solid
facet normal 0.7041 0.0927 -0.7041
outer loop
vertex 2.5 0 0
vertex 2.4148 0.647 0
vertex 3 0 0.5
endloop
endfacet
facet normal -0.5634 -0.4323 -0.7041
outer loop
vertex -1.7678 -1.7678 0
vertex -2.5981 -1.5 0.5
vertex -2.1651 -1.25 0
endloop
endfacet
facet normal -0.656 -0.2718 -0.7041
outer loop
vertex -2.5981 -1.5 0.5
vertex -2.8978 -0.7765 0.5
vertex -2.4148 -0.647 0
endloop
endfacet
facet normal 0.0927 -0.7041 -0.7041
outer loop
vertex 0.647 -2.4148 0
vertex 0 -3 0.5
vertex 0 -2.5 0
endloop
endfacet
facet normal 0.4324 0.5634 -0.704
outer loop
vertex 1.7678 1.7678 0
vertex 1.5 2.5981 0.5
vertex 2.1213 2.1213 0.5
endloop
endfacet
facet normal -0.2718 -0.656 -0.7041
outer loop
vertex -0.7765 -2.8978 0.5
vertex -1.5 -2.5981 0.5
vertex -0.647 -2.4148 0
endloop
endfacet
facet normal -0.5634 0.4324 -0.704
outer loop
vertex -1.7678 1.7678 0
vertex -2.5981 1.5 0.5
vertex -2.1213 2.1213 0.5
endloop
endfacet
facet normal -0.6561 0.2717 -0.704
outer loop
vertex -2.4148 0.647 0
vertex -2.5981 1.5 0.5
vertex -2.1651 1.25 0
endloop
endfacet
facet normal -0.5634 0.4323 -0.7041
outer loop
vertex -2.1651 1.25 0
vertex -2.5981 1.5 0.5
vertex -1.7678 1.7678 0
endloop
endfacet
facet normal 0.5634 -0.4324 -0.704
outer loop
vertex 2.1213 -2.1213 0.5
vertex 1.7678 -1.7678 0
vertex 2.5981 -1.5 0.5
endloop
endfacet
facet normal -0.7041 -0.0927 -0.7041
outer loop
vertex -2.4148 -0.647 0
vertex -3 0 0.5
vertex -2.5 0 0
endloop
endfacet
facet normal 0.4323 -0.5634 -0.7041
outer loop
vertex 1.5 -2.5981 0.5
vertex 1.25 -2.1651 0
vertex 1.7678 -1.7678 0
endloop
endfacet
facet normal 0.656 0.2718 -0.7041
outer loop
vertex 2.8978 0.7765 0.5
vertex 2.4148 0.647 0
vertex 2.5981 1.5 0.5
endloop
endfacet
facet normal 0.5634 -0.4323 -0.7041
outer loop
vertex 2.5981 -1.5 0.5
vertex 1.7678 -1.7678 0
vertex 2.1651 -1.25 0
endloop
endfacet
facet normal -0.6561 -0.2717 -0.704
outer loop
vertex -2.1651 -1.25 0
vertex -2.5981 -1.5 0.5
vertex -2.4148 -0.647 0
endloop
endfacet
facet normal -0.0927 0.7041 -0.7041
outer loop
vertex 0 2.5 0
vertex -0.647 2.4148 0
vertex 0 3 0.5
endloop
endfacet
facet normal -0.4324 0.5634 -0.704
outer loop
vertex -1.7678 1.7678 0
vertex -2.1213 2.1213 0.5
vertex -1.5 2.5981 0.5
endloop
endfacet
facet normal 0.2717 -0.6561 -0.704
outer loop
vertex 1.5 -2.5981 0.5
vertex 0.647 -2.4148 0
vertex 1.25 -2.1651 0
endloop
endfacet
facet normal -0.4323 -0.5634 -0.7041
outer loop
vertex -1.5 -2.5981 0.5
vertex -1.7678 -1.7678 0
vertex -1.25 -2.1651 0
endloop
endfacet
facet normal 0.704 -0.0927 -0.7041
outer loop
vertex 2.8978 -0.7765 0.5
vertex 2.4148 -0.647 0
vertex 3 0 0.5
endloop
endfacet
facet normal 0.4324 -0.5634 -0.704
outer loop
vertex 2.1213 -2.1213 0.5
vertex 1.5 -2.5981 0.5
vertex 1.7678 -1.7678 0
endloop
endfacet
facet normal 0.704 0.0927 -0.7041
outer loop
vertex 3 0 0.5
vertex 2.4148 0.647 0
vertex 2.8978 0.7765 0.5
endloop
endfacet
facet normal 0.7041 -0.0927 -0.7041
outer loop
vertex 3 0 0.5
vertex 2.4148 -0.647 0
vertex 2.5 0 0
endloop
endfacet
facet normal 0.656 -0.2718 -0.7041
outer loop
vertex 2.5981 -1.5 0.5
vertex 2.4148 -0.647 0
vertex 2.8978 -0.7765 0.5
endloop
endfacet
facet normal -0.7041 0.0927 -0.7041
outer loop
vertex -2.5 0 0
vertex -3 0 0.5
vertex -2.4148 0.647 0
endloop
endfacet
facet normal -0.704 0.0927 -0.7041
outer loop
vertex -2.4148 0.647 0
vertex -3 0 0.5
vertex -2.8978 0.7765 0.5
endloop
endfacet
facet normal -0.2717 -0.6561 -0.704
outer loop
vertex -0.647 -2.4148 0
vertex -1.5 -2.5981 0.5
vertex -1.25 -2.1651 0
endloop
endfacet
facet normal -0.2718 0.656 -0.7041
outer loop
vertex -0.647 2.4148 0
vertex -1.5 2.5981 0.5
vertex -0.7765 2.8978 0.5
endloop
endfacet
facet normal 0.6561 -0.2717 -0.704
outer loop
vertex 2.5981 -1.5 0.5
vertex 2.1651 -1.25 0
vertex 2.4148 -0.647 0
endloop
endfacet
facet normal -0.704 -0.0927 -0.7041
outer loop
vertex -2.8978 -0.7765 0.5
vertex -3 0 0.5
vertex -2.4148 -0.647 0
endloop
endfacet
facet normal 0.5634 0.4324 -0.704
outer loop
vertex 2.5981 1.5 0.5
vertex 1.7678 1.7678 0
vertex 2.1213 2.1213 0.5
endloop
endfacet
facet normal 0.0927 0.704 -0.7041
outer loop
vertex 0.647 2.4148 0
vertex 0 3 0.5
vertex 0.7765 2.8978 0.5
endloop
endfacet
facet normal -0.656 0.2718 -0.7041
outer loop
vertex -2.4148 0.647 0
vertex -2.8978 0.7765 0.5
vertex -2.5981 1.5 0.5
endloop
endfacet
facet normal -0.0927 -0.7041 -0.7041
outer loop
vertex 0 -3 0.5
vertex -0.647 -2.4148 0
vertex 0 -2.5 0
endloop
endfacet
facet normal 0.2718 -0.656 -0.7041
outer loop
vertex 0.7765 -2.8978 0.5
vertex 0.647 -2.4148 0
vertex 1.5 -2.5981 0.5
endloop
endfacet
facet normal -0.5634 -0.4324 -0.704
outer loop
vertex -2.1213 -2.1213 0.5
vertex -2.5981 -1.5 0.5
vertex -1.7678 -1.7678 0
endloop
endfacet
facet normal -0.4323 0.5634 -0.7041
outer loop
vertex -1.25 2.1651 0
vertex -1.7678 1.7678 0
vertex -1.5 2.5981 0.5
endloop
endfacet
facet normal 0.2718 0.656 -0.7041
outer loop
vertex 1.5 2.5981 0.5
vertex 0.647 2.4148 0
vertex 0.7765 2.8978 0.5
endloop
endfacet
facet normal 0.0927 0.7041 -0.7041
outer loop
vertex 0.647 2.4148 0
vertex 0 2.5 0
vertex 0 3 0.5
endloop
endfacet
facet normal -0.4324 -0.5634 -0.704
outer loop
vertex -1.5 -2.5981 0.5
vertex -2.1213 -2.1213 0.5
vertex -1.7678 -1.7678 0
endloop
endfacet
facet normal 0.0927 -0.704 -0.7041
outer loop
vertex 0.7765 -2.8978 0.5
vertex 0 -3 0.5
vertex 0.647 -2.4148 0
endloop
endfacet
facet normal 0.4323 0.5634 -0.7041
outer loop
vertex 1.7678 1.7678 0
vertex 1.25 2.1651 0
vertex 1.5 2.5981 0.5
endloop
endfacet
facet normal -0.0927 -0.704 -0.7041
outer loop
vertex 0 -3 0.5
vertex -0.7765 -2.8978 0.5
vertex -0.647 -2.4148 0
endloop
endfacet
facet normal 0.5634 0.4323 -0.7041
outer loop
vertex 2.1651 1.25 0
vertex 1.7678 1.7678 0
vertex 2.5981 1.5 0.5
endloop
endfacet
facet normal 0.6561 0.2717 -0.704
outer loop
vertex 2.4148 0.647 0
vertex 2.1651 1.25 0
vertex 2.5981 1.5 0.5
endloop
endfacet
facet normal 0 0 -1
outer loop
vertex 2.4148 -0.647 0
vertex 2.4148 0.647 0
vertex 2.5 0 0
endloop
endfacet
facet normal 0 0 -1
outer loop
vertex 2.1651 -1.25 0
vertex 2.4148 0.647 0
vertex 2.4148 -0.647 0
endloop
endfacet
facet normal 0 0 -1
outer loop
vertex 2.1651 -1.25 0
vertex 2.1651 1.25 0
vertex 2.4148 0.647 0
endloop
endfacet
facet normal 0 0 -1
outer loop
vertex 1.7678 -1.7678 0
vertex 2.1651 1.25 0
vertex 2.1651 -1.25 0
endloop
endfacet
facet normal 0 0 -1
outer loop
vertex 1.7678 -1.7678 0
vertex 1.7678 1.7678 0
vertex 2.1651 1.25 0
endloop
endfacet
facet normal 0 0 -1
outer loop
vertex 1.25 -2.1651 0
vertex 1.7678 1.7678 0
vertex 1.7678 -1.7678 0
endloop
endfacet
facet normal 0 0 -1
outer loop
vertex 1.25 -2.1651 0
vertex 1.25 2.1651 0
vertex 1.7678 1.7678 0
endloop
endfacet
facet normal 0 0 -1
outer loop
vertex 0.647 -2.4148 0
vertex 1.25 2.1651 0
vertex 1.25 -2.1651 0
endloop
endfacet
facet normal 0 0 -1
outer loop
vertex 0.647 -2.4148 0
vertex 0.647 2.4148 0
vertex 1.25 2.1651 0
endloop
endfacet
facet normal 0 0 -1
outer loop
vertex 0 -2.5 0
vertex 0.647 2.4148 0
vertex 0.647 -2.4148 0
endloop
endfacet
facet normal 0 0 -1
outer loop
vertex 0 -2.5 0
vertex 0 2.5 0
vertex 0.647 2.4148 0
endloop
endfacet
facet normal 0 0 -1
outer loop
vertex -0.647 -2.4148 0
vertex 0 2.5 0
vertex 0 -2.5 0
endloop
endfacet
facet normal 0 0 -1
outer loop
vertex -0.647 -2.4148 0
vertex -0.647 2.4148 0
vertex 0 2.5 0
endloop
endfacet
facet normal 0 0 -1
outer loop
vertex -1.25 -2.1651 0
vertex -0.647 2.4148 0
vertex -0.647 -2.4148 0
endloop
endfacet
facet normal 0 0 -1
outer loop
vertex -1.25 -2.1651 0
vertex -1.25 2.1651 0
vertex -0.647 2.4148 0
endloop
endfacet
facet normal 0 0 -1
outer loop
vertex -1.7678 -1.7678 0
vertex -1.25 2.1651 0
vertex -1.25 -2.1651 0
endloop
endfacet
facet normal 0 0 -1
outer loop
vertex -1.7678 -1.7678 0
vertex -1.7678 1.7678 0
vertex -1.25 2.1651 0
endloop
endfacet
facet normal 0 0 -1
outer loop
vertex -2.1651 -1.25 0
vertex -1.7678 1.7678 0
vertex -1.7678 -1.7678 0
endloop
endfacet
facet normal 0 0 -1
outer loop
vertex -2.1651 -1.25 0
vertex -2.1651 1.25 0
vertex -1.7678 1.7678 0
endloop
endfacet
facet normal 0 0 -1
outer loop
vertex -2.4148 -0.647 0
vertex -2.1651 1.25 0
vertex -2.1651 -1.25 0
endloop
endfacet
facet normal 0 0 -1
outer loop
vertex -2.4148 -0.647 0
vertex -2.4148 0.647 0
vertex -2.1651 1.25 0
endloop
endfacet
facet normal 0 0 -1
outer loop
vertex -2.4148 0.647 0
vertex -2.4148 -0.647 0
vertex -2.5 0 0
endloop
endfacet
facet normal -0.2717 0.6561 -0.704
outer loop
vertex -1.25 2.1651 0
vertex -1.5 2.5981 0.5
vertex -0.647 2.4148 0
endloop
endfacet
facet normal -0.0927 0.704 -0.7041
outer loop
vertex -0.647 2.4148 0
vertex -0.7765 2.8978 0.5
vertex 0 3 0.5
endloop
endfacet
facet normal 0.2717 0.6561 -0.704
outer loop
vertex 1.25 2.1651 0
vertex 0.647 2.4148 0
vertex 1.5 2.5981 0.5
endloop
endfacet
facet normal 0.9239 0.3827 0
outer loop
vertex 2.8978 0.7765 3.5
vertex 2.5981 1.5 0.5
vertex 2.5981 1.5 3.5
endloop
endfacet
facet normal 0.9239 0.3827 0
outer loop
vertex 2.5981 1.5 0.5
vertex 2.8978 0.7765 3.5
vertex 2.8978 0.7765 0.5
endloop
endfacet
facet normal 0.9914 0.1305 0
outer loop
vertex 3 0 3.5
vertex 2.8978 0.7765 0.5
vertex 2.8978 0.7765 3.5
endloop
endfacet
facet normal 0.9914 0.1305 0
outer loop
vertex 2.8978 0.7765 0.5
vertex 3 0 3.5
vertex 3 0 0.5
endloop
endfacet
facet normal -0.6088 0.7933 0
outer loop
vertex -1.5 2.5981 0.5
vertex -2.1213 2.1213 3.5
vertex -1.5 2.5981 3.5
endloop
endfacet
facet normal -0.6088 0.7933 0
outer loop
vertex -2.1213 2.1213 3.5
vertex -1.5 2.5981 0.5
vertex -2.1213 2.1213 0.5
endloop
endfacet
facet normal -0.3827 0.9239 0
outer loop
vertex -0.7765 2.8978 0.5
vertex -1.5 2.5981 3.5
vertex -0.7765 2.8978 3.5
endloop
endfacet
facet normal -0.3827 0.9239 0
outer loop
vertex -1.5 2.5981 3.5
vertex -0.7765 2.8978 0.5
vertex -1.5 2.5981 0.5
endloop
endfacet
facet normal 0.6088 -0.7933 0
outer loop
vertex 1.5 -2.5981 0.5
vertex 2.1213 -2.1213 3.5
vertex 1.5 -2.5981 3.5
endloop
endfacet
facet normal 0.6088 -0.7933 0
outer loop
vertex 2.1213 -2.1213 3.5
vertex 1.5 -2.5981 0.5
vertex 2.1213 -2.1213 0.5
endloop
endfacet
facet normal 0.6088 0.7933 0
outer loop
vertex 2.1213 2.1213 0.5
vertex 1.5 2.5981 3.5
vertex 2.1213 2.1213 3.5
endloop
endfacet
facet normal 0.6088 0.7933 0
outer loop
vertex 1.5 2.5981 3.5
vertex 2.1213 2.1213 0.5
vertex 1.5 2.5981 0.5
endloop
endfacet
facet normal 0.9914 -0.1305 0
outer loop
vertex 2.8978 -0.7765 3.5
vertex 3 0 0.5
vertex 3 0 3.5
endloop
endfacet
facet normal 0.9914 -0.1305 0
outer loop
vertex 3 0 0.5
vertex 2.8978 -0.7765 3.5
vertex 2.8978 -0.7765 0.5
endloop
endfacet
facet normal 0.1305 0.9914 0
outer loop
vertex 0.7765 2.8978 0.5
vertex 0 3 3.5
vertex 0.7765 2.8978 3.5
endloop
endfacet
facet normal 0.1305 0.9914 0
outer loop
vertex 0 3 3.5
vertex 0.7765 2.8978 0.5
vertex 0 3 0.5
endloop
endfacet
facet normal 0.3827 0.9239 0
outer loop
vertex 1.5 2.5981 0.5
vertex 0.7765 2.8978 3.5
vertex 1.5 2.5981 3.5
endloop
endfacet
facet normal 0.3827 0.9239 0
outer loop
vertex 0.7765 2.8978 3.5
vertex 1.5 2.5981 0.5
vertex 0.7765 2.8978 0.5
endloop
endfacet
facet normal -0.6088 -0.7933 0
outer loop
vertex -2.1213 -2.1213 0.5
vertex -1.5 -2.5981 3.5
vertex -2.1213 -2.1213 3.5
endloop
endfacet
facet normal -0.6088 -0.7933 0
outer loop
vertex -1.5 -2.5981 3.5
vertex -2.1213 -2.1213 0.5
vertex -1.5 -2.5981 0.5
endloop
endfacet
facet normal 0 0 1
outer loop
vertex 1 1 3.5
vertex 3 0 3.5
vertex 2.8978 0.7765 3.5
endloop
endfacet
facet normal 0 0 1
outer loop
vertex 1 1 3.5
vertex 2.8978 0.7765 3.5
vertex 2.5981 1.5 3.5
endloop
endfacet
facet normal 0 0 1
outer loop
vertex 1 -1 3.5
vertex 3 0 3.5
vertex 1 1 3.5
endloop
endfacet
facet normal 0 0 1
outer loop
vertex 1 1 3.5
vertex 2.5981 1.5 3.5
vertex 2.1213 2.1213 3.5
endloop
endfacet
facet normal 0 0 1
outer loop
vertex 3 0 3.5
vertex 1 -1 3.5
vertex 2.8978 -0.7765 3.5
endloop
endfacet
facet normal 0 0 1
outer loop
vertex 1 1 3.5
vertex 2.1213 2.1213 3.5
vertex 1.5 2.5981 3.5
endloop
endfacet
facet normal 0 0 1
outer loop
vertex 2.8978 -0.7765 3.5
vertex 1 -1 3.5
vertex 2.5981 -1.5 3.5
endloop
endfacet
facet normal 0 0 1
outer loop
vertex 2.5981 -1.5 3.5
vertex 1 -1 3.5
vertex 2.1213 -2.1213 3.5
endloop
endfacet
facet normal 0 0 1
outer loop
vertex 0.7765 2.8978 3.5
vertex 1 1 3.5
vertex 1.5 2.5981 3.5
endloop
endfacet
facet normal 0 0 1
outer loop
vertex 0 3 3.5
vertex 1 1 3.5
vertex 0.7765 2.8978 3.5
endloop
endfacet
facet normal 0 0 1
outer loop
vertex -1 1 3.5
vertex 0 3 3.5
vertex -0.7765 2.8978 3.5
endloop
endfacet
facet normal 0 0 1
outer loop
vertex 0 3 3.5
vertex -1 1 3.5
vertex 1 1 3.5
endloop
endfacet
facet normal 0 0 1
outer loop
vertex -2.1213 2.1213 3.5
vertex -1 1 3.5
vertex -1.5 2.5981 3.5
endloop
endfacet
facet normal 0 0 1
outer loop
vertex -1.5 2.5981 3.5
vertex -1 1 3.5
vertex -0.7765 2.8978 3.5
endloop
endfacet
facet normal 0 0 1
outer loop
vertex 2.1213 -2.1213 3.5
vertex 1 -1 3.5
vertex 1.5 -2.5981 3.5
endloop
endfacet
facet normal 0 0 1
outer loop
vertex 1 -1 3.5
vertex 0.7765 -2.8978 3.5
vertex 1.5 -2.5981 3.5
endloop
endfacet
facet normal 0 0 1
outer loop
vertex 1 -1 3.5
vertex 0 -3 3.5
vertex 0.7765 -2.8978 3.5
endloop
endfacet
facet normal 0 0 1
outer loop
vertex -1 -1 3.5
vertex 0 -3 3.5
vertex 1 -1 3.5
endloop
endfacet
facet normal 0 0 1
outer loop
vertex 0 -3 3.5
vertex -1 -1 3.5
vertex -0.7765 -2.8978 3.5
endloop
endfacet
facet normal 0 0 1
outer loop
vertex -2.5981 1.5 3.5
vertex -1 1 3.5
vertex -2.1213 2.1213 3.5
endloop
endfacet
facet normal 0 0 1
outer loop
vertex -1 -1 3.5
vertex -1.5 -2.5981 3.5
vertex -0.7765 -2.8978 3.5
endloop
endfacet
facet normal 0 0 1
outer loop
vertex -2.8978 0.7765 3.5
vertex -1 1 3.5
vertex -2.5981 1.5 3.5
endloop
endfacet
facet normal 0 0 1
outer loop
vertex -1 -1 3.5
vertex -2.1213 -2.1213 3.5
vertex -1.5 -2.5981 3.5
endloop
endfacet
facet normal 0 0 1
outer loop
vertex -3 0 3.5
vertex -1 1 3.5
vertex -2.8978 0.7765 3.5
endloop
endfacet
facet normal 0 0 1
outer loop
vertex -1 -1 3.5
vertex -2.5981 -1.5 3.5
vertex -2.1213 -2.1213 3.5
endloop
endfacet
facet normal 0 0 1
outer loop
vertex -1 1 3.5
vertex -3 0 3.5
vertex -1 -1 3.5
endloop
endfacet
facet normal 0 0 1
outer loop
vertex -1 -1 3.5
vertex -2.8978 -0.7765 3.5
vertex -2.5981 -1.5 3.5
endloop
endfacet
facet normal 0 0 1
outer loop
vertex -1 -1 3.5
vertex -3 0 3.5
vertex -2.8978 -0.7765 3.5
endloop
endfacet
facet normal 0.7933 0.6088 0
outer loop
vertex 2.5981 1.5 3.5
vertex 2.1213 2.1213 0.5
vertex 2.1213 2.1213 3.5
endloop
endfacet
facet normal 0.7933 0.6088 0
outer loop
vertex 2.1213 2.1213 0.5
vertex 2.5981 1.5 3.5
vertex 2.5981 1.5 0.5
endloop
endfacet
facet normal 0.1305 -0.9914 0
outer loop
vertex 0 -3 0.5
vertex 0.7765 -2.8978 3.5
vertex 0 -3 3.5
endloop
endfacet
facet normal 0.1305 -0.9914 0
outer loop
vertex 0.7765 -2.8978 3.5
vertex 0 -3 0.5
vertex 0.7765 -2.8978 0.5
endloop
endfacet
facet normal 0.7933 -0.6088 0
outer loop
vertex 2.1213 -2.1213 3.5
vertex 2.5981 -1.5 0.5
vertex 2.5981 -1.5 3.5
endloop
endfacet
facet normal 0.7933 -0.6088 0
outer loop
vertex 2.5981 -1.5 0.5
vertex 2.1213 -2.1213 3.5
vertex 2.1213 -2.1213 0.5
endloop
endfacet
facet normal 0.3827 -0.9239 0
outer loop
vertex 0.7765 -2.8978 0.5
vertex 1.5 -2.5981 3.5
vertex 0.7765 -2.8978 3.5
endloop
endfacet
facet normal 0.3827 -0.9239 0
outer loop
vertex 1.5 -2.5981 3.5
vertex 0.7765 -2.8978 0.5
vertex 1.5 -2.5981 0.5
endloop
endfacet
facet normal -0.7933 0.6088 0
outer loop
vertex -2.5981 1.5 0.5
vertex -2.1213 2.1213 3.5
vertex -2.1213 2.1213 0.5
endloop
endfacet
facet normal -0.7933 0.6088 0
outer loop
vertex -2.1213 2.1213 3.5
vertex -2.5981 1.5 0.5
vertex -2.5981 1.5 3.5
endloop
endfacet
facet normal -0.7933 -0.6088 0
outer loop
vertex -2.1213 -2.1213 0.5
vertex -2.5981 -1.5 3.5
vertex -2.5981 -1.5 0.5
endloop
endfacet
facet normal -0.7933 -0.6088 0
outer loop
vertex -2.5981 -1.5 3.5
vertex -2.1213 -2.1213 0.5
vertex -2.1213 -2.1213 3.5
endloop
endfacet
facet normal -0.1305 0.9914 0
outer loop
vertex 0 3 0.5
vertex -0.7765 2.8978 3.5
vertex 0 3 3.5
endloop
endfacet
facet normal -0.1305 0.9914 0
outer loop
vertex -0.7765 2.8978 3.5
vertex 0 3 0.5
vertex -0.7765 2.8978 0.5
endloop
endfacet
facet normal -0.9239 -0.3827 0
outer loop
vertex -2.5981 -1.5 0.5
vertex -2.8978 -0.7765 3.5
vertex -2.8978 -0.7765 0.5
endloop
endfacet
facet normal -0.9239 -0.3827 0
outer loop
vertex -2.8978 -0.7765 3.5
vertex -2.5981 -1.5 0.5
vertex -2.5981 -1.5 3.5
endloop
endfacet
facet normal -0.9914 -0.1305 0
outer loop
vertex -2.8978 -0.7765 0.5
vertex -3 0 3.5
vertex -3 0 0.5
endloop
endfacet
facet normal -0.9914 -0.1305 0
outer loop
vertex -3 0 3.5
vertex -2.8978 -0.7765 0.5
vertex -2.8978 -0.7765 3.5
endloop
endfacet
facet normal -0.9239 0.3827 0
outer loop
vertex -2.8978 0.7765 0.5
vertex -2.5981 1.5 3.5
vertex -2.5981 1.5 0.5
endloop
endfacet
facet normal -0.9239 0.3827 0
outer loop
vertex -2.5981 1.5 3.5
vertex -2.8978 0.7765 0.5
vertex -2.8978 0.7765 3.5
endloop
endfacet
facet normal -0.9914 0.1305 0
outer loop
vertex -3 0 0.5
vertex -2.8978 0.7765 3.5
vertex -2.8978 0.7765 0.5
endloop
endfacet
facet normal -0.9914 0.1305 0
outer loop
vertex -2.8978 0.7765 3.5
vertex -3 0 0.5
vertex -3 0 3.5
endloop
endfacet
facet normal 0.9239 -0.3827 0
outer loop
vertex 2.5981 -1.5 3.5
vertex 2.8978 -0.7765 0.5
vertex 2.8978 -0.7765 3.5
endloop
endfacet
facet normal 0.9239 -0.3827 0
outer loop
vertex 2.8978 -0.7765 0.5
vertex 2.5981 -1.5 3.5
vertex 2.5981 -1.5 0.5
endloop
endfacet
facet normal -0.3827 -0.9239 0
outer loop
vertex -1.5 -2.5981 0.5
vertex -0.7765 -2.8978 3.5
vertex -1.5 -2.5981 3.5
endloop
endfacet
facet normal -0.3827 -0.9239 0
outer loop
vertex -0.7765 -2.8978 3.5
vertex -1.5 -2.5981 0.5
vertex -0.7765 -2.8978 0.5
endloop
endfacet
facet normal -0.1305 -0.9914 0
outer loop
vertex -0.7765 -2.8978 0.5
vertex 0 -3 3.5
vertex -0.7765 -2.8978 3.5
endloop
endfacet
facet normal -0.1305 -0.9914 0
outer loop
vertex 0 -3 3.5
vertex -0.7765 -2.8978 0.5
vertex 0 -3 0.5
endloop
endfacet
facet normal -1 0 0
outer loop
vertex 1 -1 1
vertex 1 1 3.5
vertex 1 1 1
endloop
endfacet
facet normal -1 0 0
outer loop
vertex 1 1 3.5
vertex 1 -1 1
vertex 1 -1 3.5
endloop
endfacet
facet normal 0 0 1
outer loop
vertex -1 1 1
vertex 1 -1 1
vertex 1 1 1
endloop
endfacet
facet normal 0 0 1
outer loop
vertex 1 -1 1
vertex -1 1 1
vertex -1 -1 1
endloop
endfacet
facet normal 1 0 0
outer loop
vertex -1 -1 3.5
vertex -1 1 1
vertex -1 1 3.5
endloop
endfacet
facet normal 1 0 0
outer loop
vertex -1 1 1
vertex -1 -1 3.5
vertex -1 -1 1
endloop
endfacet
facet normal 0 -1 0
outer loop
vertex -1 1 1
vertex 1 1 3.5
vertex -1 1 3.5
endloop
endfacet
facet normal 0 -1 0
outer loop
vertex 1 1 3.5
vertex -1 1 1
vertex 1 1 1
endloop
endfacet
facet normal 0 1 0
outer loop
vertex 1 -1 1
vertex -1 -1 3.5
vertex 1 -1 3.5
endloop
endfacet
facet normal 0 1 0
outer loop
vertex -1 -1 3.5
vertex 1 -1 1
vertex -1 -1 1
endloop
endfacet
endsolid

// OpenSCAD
difference() {
	union() {
		cylinder(d1=5, d2=6, h=0.5, $fn=24);
		translate([0, 0, 0.5]) cylinder(d=6, h=3, $fn=24);
	}
	
	translate([-1, -1, 1]) cube([2, 2, 10]);
}
